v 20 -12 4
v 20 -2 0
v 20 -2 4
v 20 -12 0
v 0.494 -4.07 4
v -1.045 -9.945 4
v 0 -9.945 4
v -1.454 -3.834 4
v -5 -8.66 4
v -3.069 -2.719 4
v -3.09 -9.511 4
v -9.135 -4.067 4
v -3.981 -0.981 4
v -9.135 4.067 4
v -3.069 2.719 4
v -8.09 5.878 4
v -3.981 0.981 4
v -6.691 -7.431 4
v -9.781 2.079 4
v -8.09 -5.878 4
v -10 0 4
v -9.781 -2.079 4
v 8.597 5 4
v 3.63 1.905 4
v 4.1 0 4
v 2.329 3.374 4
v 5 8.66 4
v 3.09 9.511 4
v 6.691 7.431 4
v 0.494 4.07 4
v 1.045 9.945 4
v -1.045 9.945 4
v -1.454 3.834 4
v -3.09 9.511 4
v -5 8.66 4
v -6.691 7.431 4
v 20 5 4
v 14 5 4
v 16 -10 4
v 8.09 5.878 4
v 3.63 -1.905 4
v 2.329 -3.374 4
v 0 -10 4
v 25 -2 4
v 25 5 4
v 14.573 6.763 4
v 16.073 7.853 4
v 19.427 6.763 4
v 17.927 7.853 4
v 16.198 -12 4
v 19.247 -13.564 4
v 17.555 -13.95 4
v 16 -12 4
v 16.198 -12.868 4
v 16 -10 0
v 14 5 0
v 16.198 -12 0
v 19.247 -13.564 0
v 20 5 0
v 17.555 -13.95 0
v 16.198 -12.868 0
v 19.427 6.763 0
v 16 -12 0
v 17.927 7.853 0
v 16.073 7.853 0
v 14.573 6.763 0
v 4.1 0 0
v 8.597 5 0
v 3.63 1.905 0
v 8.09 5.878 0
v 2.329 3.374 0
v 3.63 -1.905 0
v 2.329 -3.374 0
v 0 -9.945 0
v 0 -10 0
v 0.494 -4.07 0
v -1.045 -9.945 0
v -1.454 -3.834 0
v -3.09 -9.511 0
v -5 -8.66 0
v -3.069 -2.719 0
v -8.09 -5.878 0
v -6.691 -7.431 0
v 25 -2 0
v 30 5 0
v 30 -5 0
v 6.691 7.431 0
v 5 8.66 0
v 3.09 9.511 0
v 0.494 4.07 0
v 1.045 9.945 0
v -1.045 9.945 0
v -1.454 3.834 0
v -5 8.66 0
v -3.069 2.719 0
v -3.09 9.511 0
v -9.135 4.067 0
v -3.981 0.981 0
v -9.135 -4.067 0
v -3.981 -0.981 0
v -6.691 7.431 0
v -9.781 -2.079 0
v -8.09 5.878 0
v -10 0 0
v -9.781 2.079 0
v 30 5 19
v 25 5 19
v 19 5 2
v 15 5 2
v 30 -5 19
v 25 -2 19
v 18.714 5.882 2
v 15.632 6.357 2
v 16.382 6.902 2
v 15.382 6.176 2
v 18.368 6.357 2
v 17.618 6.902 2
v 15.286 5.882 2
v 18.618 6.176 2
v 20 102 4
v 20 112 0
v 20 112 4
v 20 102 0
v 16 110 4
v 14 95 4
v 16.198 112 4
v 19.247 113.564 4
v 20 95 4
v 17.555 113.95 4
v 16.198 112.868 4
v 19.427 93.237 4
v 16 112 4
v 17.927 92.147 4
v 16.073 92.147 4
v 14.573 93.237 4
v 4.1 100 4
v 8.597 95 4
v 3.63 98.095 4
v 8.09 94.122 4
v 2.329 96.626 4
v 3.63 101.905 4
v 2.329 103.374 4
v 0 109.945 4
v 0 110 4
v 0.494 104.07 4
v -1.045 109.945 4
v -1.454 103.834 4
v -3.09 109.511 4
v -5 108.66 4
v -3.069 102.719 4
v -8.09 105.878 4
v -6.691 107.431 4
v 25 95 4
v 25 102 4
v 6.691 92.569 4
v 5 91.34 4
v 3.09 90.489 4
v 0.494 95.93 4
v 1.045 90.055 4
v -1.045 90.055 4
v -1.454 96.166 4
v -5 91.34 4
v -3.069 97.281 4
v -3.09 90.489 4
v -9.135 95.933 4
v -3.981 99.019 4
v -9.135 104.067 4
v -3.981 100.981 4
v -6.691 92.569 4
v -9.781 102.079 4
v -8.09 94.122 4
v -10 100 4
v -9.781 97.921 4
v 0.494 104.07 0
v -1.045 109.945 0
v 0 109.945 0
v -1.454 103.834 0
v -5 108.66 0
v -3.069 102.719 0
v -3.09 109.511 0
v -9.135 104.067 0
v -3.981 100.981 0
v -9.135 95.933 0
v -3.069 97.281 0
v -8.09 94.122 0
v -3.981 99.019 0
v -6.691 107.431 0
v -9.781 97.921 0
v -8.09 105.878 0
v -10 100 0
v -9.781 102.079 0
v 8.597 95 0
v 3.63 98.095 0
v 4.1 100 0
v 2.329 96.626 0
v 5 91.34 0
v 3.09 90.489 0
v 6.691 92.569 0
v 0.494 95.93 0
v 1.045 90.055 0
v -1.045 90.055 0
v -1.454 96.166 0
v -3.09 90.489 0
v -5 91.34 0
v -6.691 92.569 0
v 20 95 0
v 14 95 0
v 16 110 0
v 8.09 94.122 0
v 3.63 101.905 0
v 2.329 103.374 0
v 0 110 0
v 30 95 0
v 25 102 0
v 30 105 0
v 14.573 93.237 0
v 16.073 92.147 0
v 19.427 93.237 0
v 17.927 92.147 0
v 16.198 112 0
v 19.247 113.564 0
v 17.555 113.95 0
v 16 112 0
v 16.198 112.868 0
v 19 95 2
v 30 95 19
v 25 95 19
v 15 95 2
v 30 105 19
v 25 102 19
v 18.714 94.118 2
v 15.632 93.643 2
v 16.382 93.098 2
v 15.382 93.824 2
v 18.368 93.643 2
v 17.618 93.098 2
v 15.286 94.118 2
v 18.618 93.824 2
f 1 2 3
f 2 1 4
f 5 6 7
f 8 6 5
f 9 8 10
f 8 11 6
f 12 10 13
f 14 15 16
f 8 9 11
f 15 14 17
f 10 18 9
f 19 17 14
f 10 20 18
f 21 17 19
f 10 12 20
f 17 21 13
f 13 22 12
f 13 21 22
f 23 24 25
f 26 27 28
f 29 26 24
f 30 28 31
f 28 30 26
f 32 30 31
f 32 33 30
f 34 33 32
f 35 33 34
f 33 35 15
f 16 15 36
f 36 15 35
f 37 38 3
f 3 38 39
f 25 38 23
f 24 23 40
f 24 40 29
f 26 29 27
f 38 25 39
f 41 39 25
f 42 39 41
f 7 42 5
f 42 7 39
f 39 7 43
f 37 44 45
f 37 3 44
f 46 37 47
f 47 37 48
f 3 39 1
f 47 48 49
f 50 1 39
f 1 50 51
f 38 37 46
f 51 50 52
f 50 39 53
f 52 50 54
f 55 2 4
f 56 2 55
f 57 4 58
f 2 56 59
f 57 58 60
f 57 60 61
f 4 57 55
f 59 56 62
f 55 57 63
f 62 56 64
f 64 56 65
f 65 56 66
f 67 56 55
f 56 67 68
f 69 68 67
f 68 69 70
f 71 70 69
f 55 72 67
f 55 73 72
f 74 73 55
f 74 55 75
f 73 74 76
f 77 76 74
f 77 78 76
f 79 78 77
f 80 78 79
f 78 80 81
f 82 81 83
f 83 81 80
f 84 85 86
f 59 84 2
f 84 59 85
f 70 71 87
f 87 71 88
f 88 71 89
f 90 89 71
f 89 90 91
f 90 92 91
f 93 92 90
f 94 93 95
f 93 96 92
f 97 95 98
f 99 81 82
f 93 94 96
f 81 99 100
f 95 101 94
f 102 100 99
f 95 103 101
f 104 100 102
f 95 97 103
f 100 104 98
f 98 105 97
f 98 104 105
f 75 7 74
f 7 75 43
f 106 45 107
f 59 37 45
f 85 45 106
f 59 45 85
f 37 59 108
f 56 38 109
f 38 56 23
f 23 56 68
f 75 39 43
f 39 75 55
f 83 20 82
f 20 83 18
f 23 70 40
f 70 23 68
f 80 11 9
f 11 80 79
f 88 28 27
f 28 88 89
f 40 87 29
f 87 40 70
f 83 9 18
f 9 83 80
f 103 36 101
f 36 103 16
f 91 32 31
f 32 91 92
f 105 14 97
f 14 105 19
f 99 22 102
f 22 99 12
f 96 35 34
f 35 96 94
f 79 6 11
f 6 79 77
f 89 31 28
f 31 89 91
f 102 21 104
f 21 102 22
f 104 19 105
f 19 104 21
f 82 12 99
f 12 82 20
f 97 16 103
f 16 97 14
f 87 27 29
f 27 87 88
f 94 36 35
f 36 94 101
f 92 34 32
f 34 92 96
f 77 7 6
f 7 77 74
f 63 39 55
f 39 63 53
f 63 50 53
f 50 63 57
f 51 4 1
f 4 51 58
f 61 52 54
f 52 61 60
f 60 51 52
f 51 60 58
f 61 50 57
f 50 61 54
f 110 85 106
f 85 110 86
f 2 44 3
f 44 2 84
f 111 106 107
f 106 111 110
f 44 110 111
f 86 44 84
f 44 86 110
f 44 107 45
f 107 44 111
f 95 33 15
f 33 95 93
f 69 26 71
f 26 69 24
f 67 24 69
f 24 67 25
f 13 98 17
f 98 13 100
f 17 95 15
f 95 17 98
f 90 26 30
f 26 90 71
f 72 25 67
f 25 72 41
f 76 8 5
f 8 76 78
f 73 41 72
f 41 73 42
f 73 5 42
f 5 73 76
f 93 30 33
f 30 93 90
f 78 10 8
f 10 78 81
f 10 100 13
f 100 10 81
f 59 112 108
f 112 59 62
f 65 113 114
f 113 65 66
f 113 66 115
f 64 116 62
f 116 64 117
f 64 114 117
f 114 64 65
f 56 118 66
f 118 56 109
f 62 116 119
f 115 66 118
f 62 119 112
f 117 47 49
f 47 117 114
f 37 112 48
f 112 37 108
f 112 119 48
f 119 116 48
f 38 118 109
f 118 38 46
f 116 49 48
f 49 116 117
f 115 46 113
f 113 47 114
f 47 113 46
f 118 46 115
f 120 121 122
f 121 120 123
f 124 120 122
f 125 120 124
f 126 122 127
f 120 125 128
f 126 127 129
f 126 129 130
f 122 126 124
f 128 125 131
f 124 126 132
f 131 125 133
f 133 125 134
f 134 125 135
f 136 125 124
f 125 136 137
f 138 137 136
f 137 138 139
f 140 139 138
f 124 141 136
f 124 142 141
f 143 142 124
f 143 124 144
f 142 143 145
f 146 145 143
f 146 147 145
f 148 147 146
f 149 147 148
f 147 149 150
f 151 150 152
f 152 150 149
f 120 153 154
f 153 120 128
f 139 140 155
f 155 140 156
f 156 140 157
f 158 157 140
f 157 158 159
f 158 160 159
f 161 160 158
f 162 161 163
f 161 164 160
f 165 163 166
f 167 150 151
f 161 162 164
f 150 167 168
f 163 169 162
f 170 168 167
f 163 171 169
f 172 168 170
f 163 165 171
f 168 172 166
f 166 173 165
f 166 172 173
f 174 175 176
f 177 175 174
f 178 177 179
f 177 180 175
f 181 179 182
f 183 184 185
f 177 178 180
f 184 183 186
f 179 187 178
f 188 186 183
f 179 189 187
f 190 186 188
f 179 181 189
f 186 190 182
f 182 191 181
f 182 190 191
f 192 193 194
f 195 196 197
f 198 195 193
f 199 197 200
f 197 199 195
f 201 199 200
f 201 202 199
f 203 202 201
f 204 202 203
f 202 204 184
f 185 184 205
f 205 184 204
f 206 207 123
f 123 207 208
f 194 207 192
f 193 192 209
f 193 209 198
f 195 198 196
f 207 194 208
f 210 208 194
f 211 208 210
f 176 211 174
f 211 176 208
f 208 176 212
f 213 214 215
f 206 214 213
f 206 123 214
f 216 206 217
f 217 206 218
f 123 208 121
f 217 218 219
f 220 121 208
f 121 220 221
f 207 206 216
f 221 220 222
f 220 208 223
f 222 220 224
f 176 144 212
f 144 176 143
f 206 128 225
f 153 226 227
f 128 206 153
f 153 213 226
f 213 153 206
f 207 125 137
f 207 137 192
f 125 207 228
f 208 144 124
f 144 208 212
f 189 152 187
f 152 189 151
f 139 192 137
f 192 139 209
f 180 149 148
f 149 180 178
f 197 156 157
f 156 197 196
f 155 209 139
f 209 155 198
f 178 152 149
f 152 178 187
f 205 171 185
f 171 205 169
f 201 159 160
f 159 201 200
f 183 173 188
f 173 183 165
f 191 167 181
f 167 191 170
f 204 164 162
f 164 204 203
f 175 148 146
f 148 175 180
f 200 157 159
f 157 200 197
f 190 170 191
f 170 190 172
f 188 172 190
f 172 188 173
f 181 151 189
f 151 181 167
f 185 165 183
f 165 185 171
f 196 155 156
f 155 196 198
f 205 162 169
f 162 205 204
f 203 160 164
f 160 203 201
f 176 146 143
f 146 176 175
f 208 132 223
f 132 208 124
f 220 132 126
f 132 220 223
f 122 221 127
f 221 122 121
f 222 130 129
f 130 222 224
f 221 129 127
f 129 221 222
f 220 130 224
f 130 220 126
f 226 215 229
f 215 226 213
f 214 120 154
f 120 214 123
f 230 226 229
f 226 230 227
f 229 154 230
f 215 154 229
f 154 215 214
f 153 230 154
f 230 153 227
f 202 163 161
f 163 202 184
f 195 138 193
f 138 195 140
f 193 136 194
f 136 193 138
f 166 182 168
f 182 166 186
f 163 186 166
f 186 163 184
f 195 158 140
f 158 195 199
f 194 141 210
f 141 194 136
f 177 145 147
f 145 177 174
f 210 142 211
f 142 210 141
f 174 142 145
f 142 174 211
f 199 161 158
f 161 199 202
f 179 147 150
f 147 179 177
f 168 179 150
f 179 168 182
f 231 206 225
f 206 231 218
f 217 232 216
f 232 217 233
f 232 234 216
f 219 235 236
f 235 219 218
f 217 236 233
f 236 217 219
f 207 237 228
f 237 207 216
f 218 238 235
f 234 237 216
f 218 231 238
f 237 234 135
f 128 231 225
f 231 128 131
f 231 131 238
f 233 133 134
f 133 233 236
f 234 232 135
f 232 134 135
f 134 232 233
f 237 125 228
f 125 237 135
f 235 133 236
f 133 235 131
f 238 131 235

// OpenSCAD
// file: config_4x5.scad
/*
This is the base configuration file for the 4x5" format
# we are not using the exact ANSI measures, but slightly rounded measures for slight simplification
*/
vStabilizerTotal_h = 7;

// general tolerance
vTolerance = 0.2;

// sheet film and cassette measurements (roughly based on the ANSI measurements)
vFilmSheet_l = 127;
vFilmSheet_w = 102;
vCassette_l = 160; // A min
vCassette_w = 121; // B max
vCassette_h = 13.2; // C max
vLightTrap_l = 2; // M2
vLightTrap_w = vCassette_w;
vLightTrap_h = 1.5; // M1
vLightTrap_offsetX = 141; // G max
vFilmWindow_l = 121;
vFilmWindow_w = 101;
vFilmWindow_offsetX = 16;
vGroundGlass_offsetZ = 5;

// Graflok
vGraflok_h = 6; // this is not the official measurement, just measured from a camera 

// lens board measures (we are using Wista/Technika-style lensboards)
vLensboard_l = 100;
vLensboard_w = 97;
vLensboard_h = 2;
vLensboard_offsetX = -(vLensboard_l+3)/2; // caution: we have an asymetric offset!
vLensboard_offsetY = -vLensboard_w/2;
vLensboardHole_d = 85;
vLensboardLighttrap_d = 89;
vLensboardLighttrap_h = 1+vTolerance;

// bellows frame measures - the bellows frame design is derived from standardcameras.com
// back frame
vBellowsBackInner_l = 144; //???? check and replace with the measurement from your bellows!
vBellowsBackInner_w = vBellowsBackInner_l;
vBellowsBackOuter_l = vBellowsBackInner_l+1;
vBellowsBackOuter_w = vBellowsBackOuter_l;

vBellowsBackFrameOuter_l = 159;
vBellowsBackFrameOuter_w = vBellowsBackFrameOuter_l;
vBellowsBackFrameOuter_h = 7;
vBellowsBackFrameInner_l = 135;
vBellowsBackFrameInner_w = vBellowsBackFrameInner_l;
vBellowsBackFrameInner_h = 5;

vBellowsBackLightTrapOuter_l = vBellowsBackFrameInner_l+2*2;
vBellowsBackLightTrapOuter_w = vBellowsBackLightTrapOuter_l;
vBellowsBackLightTrap_h = 3;

//vBellowsBackFrameScrewHole_d = 2;
//vBellowsBackFrameScrewHole_h = 10;
vBellowsBackFrameScrewHole_offsetXY = 70;
vBellowsBackFrameScrewHole_offsetZ = vBellowsBackFrameOuter_h/2;

// front frame
vBellowsFrontInner_l = 94; //???? check and replace with the measurement from your bellows!
vBellowsFrontInner_w = vBellowsFrontInner_l;
vBellowsFrontOuter_l = vBellowsFrontInner_l+1;
vBellowsFrontOuter_w = vBellowsFrontOuter_l;

vBellowsFrontFrameOuter_l = 104;
vBellowsFrontFrameOuter_w = vBellowsFrontFrameOuter_l;
vBellowsFrontFrameOuter_h = 7;
vBellowsFrontFrameInner_l = 82;
vBellowsFrontFrameInner_w = vBellowsFrontFrameInner_l;
vBellowsFrontFrameInner_h = 5;

vBellowsFrontLightTrapOuter_l = vBellowsFrontFrameInner_l+2*2;
vBellowsFrontLightTrapOuter_w = vBellowsFrontLightTrapOuter_l;
vBellowsFrontLightTrap_h = 0;

//vBellowsFrontFrameScrewHole_d = 2;
//vBellowsFrontFrameScrewHole_h = 10;
vBellowsFrontFrameScrewHole_offsetXY = 40;
vBellowsFrontFrameScrewHole_offsetZ = vBellowsFrontFrameOuter_h/2;

// body dimensions
vWall_strength = 5;
vBodyOuter_l = 185; // make sure this is at least 4*vWall_strength larger than vBellowsBackFrameOuter_l!
vBodyOuter_w = 170; // make sure this is at least 2*vWall_strength larger than vBellowsBackFrameOuter_l!
vBodyOuter_h = 65;
vBodyEdge_r = vWall_strength;

// we will center our model on the Y axis and on the center of the bellows frame
// at least for the 4x5 version, we have to do an asymetric offset of 2.5mm on the X-axis 
vAsymOffsetX = -2.5;  

// back plate
vBackPlateLength = 160; // we will probably use about the same size as the bellows back frame
vBackPlateStrength = vWall_strength;

// hinges for front lid
vHingeInnerDistance = 100;
vHingeBaseWidth = 20;
vHingeHole = 4;

// lid lock measures
vLidLockBase_d = 8;
vLidLockHole_distance = 70;

// rail dimensions
vLowerRail_w = 90;
vUpperRail_w = vLowerRail_w;

// cutout for stop indents
vStopIndent_l = 4;
vStopIndent_h = 5;
vStopIndentDistance = 25; // shorter than 25 is not necessary
vStopIndent_offsetX = 20; // don't go shorter than 20 if you intend to use a 90mm lens!

// for all dovetails we use a base width of 5mm and a base height of 5mm
// we are applying tolerances to the inner AND outer part of a dovetail, in width and height
vDoveTail_w = 5;
vDoveTail_h = 5;
vDoveTail_tolerance = 0.2;

// front standard carrier / slider
// width is depending on vUpperRail_w
vSliderBase_w = vUpperRail_w + (4*vDoveTail_w);
vSliderBase_l = 40; // make sure to have enough space in the body.


// lever plate 
vLeverPlateBase_w = vUpperRail_w - (8*vDoveTail_w);
vLeverPlateBlock_w = 25;
vLeverPlateBlock_l = vSliderBase_l-(2*vDoveTail_w);

vFrontStandard_h = 130;
vFrontStandardSlot_h = vFrontStandard_h - 30;

// lensboard carrier
vFrontPlate_length = vSliderBase_w+6; // vSliderBase_w is a bit too tight for 4x5", so there we will add 5mm, for 5x7 vSliderBase_w is OK to get a squared lensboard carrier
vFrontPlate_width = vSliderBase_w; //vFrontPlate_length;
vFrontPlate_height = 16;
vEdgeCutCylinder = floor(sqrt(2*pow(vFrontPlate_width,2)))-5;

vTiltDovetailBase_d1 = 30;
vTiltDovetailBase_d2 = vTiltDovetailBase_d1+(2*vDoveTail_w);
vTiltDovetailBaseBlock_d = vTiltDovetailBase_d1+(4*vDoveTail_w);

vTiltDovetail_d1 = vTiltDovetailBase_d1-vTolerance;
vTiltDovetail_d2 = vTiltDovetailBase_d2-vTolerance;
vTiltDovetail_h = vDoveTail_w-vTolerance;

vTiltDovetailCutout_d1 = vTiltDovetailBase_d2+vTolerance;
vTiltDovetailCutout_d2 = vTiltDovetailBase_d1+vTolerance;

vAxisHole_d = 10+vTolerance;
vAxisHole_h = vDoveTail_w+vTolerance;

vTiltLockBolt_d = 12;
vTiltLockBolt_h = 14;
//vTiltLockBoltHole_d = 8;
//vTiltLockBoltHole_h = vTiltLockBolt_h;

vTiltHeight = 50;
vTiltRadius = vFrontPlate_length/2;
vTiltAngleMinus = -7;
vTiltAnglePlus = 7;
vTiltAxis_d = 10-vTolerance;

// focusing rod
vFocusingRod_d = 6;
vFocusingKnob_d = 25;
vFocusingKnob_h = 20;

// stabilizer measures (just the outer measures of our stabilizer block, not the tripod slider)
vStabilizerBase_l = 135;
vStabilizerBase_w = 90;  
vStabilizerBase_h = 7;
vStabilizerDovetailBase_w = 50;
// screw holes for the stabilizer
vLidHoleCount_x = 4;
vLidHoleDist_x = 35;
vLidHoleCount_y = 2;
vLidHoleDist_y = 60;


// screw diameters, length is individually set
vScrew1Hole_d = 3;
vScrew1ThreadHole_d = 2.2;
vScrew2Hole_d = 2;
vScrew2ThreadHole_d = 1.4;


// Dimensions for small heat set insert holes.
// Sized for M2 inserts, 3 mm depth, 3.5 mm max OD
// (may be labelled M2x3.5x3)
vInsertM2Hole_d = 3.2;
vInsertM2MinDepth_h = 4.0;
vInsertM2Size_d = 3.5;
vInsertM2Depth_h = 3.0;

// Dimensions for heat set insert holes.
// Sized for "Voron standard" M3 inserts, 4 mm depth, 5 mm max OD
// (variously labelled M3x4x5 or M3x5x4)
vInsertM3Hole_d = 4.7;
vInsertM3MinDepth_h = 5.0;
vInsertM3Size_d = 5.0;
vInsertM3Depth_h = 4.0;

// Dimensions for large heat set insert holes.
// Sized for M5 inserts, 5 mm depth, 7 mm max OD
// (may be labelled M5x7x5)
vInsertM5Hole_d = 6.7;
vInsertM5MinDepth_h = 6.0;
vInsertM5Size_d = 7.0;
vInsertM5Depth_h = 5.0;


// Handle strap
vHandleStrap_h = 2.0;       // Thickness of the strap in mm
vHandleStrap_w = 15.0;      // Width of the strap in mm
vHandleStrap_l = 145.0;     // Total length of the strap in mm
vHandleStrapMovement_l = 35.0;   // Total amount the strap moves, in mm. Each side moves half this amount.
vHandleStrapCutout_w = 4.0;      // Width of the central cutout, in mm
vHandleStrapSlotOffsetFar = vHandleStrap_l/2 - vHandleStrap_w/2;
vHandleStrapSlotOffsetNear = vHandleStrapSlotOffsetFar - vHandleStrapMovement_l/2;
vHandleStrapCoverExtra_l = 5.0;
vHandleStrapHoleSize_d = 3.0;
vStrapHoleDelta = vHandleStrapSlotOffsetNear-vHandleStrapCoverExtra_l+vHandleStrapHoleSize_d/2;
vStrapHoleSpacing = vHandleStrapMovement_l/2 + vHandleStrap_w/2;
// file: modules.scad
/*
This is a collection of the modules which are used heavily within the whole project.
Almost all parts rely on the modules to remain "as is", especially regarding their current orientation.
So please act very carefully here, otherwise you may screw up the complete design!

*/
include <baseconfig.scad>;


// roof module - this is heavily used for dovetail cutouts
// please keep as is
module roof(l, w, h){
    polyhedron(
        points=[
            [0,0,0],
            [l,0,0],
            [l,w,0],
            [0,w,0],
            [0,w/2,h],
            [l,w/2,h]
            ],
        faces=[
            [0,1,2,3],
            [0,4,1],
            [1,4,5,2],
            [2,5,3],
            [3,5,4,0]
            ]
            );
    };

// a wedge module - this is heavily used for cutting edges
// please keep as is    
module wedge(l, w, h) {
    polyhedron(
            points=[
                [0,0,0],
                [l,0,0],
                [l,w,0],
                [0,w,0],
                [0,0,h],
                [l,0,h]
            ],
            faces=[
                [0,3,2,1],
                [0,1,5,4],
                [1,2,5],
                [2,3,4,5],
                [3,0,4]
            ]
    );
   };

// simple tube module.   
module tube(d1, d2, h) {
    difference() {
        cylinder(d=d1, h=h);
        cylinder(d=d2, h=h);
        };
    };

// mainly used for making holes for countersunk screws
// please keep as is    
module countersunk_screw(vScrew_d, vScrew_l){
    union(){
    cylinder(d=vScrew_d, h=vScrew_l);
    cylinder(d1=vScrew_d*2, d2=0, h=vScrew_d);
    };
};

// module for making hexagons, e.g. hex nuts. kw is the key width
// please keep as is
module hex(kw, h) {
	render()
        translate([0, 0, h/2])
            intersection_for(a = [0, 120, 240]) {
                rotate([0, 0, a])
                    cube([kw, 3 * kw, h], true);
                }
}


// Heatset insert
// d: Thread diameter
// od: Outer diameter
// l: Total length
module insert(d, od, l)
{
    echo(Insert = d, od, l);
    difference() {
        cylinder(l, d=od, $fn=15);
        translate([0, 0, -0.5]) cylinder(l+1, d=d, $fn=15);
        };
}

module insert_m2()
{
    color("gold") insert(2, vInsertM2Size_d, vInsertM2Depth_h);
}

module insert_m3()
{
    color("gold") insert(3, vInsertM3Size_d, vInsertM3Depth_h);
}

module insert_m5()
{
    color("gold") insert(5, vInsertM5Size_d, vInsertM5Depth_h);
}

// Countersunk screw, metric, for display
// Example: https://www.aliexpress.com/item/1005007838338973.html
module screw_cs(l, d=3, dk=6, s=2, t=1) {
    // l: total length (including head) in mm
    // d: thread diameter (eg 3 for M3)
    // dk: max head diameter
    // s: hex socket flat-to-flat size
    // t: hex socket depth
    echo(CountersunkScrew = d, l);
    difference() {
        union() {
            cylinder(h=l, r=d/2, $fn=15);
            cylinder(h=(dk-d)/2, r1=dk/2, r2=d/2, $fn=15);
            }
        cylinder(h=t, r=s/2*2/sqrt(3), $fn=6);
    }
}

module screw_m3_cs(l) {
    color("silver") screw_cs(l, d=3, dk=6, s=2, t=1);
}

module screw_m2_cs(l) {
    color("silver") screw_cs(l, d=2, dk=3.8, s=1.5, t=0.75);
}
module screw_m5_cs(l) {
    color("silver") screw_cs(l, d=5, dk=9.5, s=3, t=1.6);
}

// Button head screw, metric, for display
// Example: https://www.aliexpress.com/item/32967225441.html
module screw_bh(l, d=3, k=1.5, dk=5.5, s=2, t=1) {
    // l: shaft length (NOT including head) in mm
    // d: thread diameter (eg 3 for M3)
    // k: head depth
    // dk: head max diameter
    // s: hex socket flat-to-flat size
    // t: hex socket depth
    echo(ButtonheadScrew = d, l);
    difference() {
        union() {
            translate([0, 0, k]) cylinder(h=l, r=d/2, $fn=15);
            difference() {
                translate([0, 0, k]) intersection() {
                    sphere(d=dk, $fn=15);
                    translate([-dk/2, -dk/2, -dk]) cube(dk);
                }
                translate([-dk/2, -dk/2, -dk]) cube(dk);
            }
        }
        cylinder(h=t, r=s/2*2/sqrt(3), $fn=6);
    }
}

module screw_m2_bh(l) {
    color("silver") screw_bh(l, d=2, dk=3.4, s=1.175, t=0.6);
}

module screw_m3_bh(l) {
    color("silver") screw_bh(l, d=3, dk=5.7, s=2, t=1);
}


module nut_m5() {
    echo(Nut = 5);
    difference() {
        rotate([0, 0, 30]) cylinder(h=3.9, d=8*2/sqrt(3), $fn=6);
        cylinder(h=5, d=5, $fn=15);
        }
    }
    
    
module thumbscrew(bolt_d, bolt_dk, screw_d, screw_h, n_knurls, knurl_d, knurl_f) {
    // bolt_d:  central bolt diameter
    // bolt_dk: bolt head max diameter
    // screw_d: thumbscrew outer diameter
    // screw_h: thumbscrew height
    // n_knurls: number of knurls
    
    min_knurl_offset = screw_d/2 - knurl_d;
    max_knurl_offset = screw_d/2 + knurl_d;
    knurl_offset = min_knurl_offset + knurl_f*(max_knurl_offset - min_knurl_offset);
    
    difference()
    {
        union()
        {
            translate([0, 0, 1]) cylinder(screw_h-2, d=screw_d);
            cylinder(1, d1=screw_d-1, d2=screw_d);
            translate([0, 0, screw_h-1]) cylinder(1, d1=screw_d, d2=screw_d-1);
        }
        cylinder(screw_h, d=bolt_d);
        cylinder(bolt_dk/2, d1=bolt_dk, d2=0);
        for (i = [1:n_knurls])
        {
            rotate([0, 0, i*360/(n_knurls)]) translate([knurl_offset, 0, 0]) cylinder(screw_h, d=knurl_d);
        }
    }
}

module thumbscrew_m5(screw_d, screw_h, n_knurls, knurl_d, knurl_f) {
    thumbscrew(5, 9.5, screw_d, screw_h, n_knurls, knurl_d, knurl_f);
}


module t6_flange_coupler() {
    // T6 flange coupler
    // Example: https://www.aliexpress.com/item/1005008049363389.html
    echo(FlangeCoupler = 6);
    difference() {
        union() {
            translate([0, 0, 2]) cylinder(h=10, d=10);
            cylinder(h=2, d=22);
        }
        cylinder(h=12, d=6);
        translate([0, 15, 7]) rotate([90, 0, 0]) cylinder(h=30, d=3);
        for (i = [0:3]) {
            rotate([0, 0, 45+90*i]) translate([-8, 0, 0]) cylinder(h=2, d=3);
        }
    }
}


module AXK0619_thrust_bearing() {
    echo(ThrustBearing = "AXK0619");
    difference() {
        cylinder(h=4, d=19);
        cylinder(h=4, d=6);
    }
}


module t6_lead_screw(l) {
    echo(LeadScrewT6 = l);
    color("silver") cylinder(h=l, d=6);
}

module t6_lead_screw_nut() {
    echo("LeadScrewT6Nut");
    intersection()
    {
        difference() {
            union() {
                cylinder(h=15, d=12);
                translate([0, 0, 1.5]) cylinder(h=3.5, d=24);
            }
            cylinder(h=15, d=6);
        }  
        translate([-50, -12.5/2, -50]) cube([100, 12.5, 100]);
    }
}

module threaded_rod_m5(l) {
    echo(ThreadedRodM5 = l);
    color("silver") cylinder(h=l, d=5);
}

module smooth_rod_m4(l) {
    echo(SmoothRodM4 = l);
    color("silver") cylinder(h=l, d=4);
}


module screw_m3_grub(l) {
    echo(GrubScrew = 3, l);
    color("silver") cylinder(h=l, d=3, $fn=15);
}


module screw_m5_grub(l) {
    echo(GrubScrew = 5, l);
    color("silver") cylinder(h=l, d=5, $fn=15);
}


module washer_m6() {
    // M6x12x0.8 washer
    echo(Washer = 6, 0.8);
    difference() {
        cylinder(h=0.8, d=12);
        cylinder(h=0.8, d=6.6);
    }
}


module springwasher_m6() {
    // M6x12x1.5 washer (compresses to 0.5)
    // Show as compressed (~0.5 mm height)
    echo(SpringWasher = 6);
    difference() {
        cylinder(h=0.5, d=12);
        cylinder(h=0.6, d=6);
    }
}


module chamfer_cylinder(h, d, c=0) {
    if (h >= c) {
        cylinder(h=h-c, d=d);
        translate([0, 0, h-c]) cylinder(h=c, d1=d, d2=d-c);
    } else {
        cylinder(h=h, d=d);
    }
}

module chamfer_cube(w, d, h, c=0) {
    if (h >= c) {
        difference() {
            cube([w, d, h]);
            translate([-c, 0, h]) rotate([0, 45, 0]) cube([sqrt(2)*c, d, sqrt(2)*c]);
            translate([w-c, 0, h]) rotate([0, 45, 0]) cube([sqrt(2)*c, d, sqrt(2)*c]);
            translate([0, 0, h-c]) rotate([45, 0, 0]) cube([w, sqrt(2)*c, sqrt(2)*c]);
            translate([0, d, h-c]) rotate([45, 0, 0]) cube([w, sqrt(2)*c, sqrt(2)*c]);
        }
    } else {
        cube(wdh);
    }
}

module rounded_rect(l, w, h) {
    union()
    {
        translate([-l/2+w/2, 0, 0]) cylinder(h=h, d=w);
        translate([l/2-w/2, 0, 0]) cylinder(h=h, d=w);
        translate([-(l-w)/2, -w/2, 0]) cube([l-w, w, h]);
    }
}
// file: baseconfig.scad
/*
Here we define some variables which are independent from the camera format
*/


// some generic variables

// we are including a format specific configuration sheet - but make sure to include only one!

include <config_4x5.scad>;
// include <config_5x7.scad>;
// include <config_8x10.scad>;

// Arca Swiss tripod plate
// caution: some Arca Swiss compatible tripod heads may have slight variations
// vArca_length = xx; // the length is irrelevant here
vArca_width = 38;
vArca_height = 7;
vArcaBase_cutout = 4;
vArcaBase_height = 1.5;
// main file
// loading the base configuration
include <baseconfig.scad>;

// some modules such as hex, countersunk screws, roof, wedge are available in a module file
use <modules.scad>;

module pulling_lever() {

vLeverBasePlate_length = 20;
vLeverBasePlate_width = 15;
vLeverBasePlate_height = 4;
vLeverBasePlate_offsetX = 0;
vLeverBasePlate_offsetY = -10;
vLeverBasePlate_offsetZ = 0;

vLockingBolt_length = 4;
vLockingBolt_width = 2;
vLockingBolt_radius = vLockingBolt_width;
vLockingBolt_height = vLeverBasePlate_height;
vLockingBolt_offsetX = vLeverBasePlate_length-vLockingBolt_length;
vLockingBolt_offsetY = vLeverBasePlate_offsetY-vLockingBolt_width;
vLockingBolt_offsetZ = 0;

vPullingLever_length = 30;
vPullingLever_width = 7;
vPullingLever_height = vLeverBasePlate_height;
vPullingLever_offsetX = 0;
vPullingLever_offsetY = -2;
vPullingLever_offsetZ = 0;

vPullingGrip_length = 5;
vPullingGrip_width = vPullingLever_width;
vPullingGrip_height = vLeverBasePlate_height+15;
vPullingGrip_offsetX = vPullingLever_length-vPullingGrip_length;
vPullingGrip_offsetY = vPullingLever_offsetY;
vPullingGrip_offsetZ = 0;
vPullingGripWedge_length = vPullingGrip_length;
vPullingGripWedge_width = -3;
vPullingGripWedge_height = vPullingGrip_height;
vPullingGripWedge_offsetX = vPullingLever_length;
vPullingGripWedge_offsetY = vPullingLever_offsetY;
vPullingGripWedge_offsetZ = vPullingGrip_height;

vSpringLever_d1 = 6;
vSpringLever_d2 = 2;
vSpringLever_h = vLeverBasePlate_height;
vSpringLever_offsetX = vLeverBasePlate_length-(vSpringLever_d1/2);
vSpringLever_offsetY = 5;
vSpringLever_offsetZ = 0;


vBoltHole_d = 8+vTolerance;
vBoltHole_h = vLeverBasePlate_height;
vBoltHole_offsetX = 0;
vBoltHole_offsetY = 0;
vBoltHole_offsetZ = 0;




// temporary objects

translate([vSpringLever_offsetX, vSpringLever_offsetY, vSpringLever_offsetZ])
    cylinder(d1=vSpringLever_d1, d2=vSpringLever_d2, h=vSpringLever_h);
translate([vSpringLever_offsetX, vSpringLever_offsetY, vSpringLever_offsetZ])
    cylinder(d1=vSpringLever_d2, d2=vSpringLever_d1, h=vSpringLever_h);

difference(){
    union(){
            translate([vLeverBasePlate_offsetX, vLeverBasePlate_offsetY, vLeverBasePlate_offsetZ])
                cube([vLeverBasePlate_length, vLeverBasePlate_width, vLeverBasePlate_height]);
            
            // rounded back
            translate([vLeverBasePlate_offsetX, 0, vLeverBasePlate_offsetZ])
                cylinder(h=vLeverBasePlate_height, d=vLeverBasePlate_length);    
            
            // locking bolt
            translate([vLockingBolt_offsetX, vLockingBolt_offsetY, vLockingBolt_offsetZ])
                cube([vLockingBolt_length, vLockingBolt_width, vLockingBolt_height]);
            translate([vLockingBolt_offsetX+vLockingBolt_radius, vLockingBolt_offsetY, vLockingBolt_offsetZ])
                cylinder(h=vLockingBolt_height, r=vLockingBolt_width);
            
            // pulling lever
            translate([vPullingLever_offsetX, vPullingLever_offsetY, vPullingLever_offsetZ])
                cube([vPullingLever_length, vPullingLever_width, vPullingLever_height]);
        
            translate([vPullingGripWedge_offsetX, vPullingGripWedge_offsetY, vPullingGripWedge_offsetZ])
                rotate([0, 90, 90])
                    wedge(vPullingGripWedge_height, vPullingGripWedge_length, vPullingGripWedge_width);

            translate([vPullingGrip_offsetX, vPullingGrip_offsetY, vPullingGrip_offsetZ])
                cube([vPullingGrip_length, vPullingGrip_width, vPullingGrip_height]);
                
            
            
        };
    translate([vBoltHole_offsetX, vBoltHole_offsetY, vBoltHole_offsetZ])
                cylinder(h=vBoltHole_h, d=vBoltHole_d); 

};

};

pulling_lever();

translate([0, 100, 0]) scale([1, -1, 1]) pulling_lever();
